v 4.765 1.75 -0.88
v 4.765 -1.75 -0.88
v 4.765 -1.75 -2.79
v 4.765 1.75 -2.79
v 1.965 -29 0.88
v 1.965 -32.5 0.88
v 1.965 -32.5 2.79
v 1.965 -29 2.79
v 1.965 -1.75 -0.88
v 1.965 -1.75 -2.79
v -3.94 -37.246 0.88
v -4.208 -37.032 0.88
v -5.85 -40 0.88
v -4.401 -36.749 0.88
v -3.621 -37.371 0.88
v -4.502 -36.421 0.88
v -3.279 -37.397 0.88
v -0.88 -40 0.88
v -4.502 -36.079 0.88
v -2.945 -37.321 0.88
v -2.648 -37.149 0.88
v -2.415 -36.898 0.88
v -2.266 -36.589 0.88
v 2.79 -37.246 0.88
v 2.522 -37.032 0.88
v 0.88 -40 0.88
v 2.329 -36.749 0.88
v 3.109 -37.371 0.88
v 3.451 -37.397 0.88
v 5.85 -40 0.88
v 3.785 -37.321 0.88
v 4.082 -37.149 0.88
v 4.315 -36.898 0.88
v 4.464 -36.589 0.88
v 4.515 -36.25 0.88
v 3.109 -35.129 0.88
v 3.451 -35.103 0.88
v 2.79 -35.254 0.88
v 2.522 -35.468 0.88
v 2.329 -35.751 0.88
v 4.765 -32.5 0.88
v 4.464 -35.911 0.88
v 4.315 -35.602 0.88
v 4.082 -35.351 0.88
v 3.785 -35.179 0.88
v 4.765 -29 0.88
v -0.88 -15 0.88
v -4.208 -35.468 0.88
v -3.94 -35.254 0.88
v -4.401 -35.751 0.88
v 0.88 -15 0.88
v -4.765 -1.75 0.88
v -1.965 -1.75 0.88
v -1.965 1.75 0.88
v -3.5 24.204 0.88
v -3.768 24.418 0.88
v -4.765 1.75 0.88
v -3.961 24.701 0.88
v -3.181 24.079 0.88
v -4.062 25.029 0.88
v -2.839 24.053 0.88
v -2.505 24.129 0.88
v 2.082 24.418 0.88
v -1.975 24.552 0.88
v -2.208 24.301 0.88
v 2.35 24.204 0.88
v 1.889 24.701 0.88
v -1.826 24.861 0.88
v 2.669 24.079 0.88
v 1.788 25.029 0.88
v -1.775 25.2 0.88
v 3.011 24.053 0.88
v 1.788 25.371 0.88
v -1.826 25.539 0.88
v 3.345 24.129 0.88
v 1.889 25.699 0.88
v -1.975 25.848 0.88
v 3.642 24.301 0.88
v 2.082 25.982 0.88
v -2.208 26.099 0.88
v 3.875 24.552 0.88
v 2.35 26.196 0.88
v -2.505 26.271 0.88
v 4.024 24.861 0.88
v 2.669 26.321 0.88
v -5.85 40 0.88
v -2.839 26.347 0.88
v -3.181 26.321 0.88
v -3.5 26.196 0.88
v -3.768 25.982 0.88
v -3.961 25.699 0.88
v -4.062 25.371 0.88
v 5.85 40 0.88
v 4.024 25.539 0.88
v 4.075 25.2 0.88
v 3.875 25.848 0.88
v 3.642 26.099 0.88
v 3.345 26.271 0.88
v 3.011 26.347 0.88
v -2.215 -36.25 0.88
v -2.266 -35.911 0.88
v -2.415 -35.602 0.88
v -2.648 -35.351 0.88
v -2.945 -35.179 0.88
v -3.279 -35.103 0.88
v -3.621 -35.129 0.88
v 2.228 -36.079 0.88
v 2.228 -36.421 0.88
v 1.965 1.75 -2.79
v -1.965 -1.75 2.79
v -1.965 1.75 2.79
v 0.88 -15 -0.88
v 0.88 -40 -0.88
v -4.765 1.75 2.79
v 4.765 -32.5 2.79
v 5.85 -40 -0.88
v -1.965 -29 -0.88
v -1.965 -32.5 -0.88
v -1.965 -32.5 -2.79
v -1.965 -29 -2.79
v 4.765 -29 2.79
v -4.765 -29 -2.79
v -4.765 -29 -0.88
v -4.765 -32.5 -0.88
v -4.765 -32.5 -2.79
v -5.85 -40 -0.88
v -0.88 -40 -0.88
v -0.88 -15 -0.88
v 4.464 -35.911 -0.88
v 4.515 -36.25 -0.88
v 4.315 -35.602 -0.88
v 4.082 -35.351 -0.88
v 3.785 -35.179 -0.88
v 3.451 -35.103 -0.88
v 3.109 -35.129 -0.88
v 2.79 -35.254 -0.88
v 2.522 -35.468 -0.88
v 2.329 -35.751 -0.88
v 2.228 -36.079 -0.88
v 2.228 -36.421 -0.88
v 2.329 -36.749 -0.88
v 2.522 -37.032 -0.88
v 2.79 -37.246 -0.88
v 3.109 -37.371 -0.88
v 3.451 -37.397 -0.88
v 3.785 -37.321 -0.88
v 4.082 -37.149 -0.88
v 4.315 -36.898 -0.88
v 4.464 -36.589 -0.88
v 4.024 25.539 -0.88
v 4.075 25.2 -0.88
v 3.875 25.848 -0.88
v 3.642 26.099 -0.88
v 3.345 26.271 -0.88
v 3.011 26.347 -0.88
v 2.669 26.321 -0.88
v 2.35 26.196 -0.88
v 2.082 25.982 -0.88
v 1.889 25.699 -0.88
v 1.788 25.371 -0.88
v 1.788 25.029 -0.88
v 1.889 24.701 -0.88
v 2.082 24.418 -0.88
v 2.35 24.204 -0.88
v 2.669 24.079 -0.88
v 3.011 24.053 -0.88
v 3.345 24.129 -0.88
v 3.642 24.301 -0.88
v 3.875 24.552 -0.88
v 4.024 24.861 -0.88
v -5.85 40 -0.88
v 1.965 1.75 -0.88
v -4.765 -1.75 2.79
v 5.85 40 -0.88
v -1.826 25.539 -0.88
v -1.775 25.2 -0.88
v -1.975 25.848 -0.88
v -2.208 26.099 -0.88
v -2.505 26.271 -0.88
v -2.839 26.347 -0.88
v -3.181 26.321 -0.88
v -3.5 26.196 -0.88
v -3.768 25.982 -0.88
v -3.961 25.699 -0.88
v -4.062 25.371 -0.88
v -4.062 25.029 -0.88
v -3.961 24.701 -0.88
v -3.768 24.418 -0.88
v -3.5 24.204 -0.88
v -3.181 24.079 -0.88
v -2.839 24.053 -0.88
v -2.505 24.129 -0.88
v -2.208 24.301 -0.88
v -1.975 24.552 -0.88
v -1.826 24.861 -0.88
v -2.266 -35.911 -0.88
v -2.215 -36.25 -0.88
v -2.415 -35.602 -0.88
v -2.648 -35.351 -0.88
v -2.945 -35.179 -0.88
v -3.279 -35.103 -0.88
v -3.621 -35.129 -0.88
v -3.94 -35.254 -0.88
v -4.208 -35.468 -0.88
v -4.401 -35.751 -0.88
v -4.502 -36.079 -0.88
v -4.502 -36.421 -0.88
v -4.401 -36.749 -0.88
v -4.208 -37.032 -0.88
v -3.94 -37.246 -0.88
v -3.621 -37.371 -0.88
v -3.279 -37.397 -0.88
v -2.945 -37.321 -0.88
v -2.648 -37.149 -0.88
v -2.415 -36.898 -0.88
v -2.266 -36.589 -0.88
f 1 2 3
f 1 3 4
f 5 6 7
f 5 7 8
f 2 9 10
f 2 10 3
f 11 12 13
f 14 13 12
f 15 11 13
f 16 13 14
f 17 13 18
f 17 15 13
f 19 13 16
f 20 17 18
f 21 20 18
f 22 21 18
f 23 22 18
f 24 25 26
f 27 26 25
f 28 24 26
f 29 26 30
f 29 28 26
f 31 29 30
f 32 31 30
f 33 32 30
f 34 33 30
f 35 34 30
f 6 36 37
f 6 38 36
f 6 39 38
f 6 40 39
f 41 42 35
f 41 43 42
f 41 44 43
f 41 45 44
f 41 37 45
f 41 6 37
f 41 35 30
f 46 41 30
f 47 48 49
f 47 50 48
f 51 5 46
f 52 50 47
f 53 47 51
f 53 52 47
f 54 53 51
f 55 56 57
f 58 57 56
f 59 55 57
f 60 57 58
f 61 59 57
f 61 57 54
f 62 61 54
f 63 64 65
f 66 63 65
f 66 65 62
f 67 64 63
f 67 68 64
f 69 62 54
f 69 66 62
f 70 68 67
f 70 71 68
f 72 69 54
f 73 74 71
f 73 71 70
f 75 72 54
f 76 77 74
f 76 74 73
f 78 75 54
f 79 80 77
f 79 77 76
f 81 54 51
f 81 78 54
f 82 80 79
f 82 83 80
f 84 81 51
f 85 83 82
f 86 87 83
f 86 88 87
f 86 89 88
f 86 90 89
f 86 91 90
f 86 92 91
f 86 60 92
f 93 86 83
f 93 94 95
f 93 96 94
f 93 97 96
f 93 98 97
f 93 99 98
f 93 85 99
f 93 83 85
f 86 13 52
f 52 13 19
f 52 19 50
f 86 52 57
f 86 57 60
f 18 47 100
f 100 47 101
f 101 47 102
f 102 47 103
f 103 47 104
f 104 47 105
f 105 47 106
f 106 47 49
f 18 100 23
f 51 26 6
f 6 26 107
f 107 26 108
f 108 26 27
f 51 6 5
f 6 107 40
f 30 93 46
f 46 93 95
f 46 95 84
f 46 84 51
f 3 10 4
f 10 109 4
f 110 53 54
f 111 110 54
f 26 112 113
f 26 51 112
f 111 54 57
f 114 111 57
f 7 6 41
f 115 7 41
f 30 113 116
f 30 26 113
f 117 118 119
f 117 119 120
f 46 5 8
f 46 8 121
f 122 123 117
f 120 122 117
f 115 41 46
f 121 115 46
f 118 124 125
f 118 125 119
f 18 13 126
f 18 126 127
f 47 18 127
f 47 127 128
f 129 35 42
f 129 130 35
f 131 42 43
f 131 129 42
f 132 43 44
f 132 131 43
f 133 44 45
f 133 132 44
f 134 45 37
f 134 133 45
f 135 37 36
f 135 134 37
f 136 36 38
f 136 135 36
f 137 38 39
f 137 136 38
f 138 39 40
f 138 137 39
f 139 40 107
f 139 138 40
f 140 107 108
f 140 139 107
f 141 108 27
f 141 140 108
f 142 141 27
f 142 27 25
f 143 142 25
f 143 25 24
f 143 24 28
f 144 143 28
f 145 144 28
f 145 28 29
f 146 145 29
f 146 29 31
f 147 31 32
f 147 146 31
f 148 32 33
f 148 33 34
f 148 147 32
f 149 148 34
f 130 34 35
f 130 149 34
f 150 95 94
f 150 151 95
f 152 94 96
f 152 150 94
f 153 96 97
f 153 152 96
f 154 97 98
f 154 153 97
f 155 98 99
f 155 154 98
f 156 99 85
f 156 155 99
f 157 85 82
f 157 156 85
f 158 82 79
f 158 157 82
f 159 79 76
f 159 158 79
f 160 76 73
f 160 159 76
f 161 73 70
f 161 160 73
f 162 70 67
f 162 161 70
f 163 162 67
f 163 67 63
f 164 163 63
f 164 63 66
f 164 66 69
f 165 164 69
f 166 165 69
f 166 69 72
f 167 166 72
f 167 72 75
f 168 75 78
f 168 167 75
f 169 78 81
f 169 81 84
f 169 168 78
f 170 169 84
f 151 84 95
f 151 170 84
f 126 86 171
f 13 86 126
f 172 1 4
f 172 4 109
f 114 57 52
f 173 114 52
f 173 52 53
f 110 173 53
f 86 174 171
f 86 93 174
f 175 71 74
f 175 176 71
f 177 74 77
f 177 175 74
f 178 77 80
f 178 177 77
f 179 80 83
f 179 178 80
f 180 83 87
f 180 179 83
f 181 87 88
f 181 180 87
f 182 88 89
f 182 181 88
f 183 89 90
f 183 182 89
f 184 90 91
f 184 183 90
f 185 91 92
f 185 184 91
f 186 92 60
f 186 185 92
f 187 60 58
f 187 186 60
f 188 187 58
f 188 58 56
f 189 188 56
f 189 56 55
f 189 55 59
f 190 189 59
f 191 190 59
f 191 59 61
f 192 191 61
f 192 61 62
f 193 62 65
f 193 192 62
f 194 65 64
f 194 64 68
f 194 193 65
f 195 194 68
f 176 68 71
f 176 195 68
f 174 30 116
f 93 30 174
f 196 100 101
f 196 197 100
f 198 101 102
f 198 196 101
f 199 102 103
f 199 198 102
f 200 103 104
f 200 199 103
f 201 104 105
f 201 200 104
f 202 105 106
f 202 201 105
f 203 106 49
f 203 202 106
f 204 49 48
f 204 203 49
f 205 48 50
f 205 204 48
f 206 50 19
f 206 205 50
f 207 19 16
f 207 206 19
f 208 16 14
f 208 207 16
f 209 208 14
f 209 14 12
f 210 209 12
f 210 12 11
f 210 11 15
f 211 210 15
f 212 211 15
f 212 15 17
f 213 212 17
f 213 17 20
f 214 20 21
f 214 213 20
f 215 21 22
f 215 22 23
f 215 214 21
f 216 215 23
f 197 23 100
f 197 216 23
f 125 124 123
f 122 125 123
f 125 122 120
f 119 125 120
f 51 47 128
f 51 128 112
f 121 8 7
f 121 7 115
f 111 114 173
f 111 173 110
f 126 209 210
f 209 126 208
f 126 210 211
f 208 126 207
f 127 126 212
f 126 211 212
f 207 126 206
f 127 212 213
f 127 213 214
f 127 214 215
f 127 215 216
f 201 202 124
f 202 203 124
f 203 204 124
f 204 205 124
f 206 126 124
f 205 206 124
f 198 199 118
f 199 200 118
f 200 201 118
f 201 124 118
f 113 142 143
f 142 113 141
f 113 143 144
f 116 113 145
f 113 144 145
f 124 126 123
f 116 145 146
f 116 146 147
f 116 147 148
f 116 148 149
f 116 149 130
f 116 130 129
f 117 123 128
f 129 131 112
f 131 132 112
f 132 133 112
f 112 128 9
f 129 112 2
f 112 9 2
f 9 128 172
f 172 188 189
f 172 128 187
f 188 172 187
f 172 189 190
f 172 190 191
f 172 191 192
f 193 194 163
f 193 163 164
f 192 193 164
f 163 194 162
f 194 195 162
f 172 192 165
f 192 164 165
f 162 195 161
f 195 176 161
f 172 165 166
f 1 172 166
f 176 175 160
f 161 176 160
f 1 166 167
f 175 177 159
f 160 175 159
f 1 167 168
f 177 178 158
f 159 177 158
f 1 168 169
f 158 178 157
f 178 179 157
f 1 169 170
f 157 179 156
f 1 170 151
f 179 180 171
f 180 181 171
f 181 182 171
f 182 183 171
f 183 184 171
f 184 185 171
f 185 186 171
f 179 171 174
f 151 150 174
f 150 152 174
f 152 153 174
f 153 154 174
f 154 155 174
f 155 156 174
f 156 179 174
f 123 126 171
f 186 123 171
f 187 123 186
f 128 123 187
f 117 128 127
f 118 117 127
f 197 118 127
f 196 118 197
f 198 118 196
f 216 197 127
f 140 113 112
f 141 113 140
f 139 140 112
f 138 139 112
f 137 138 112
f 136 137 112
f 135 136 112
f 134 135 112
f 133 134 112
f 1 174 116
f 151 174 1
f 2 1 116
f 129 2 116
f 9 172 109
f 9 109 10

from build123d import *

# Parameters (mm, degrees)
F0_R      = 1.15
F1_DEPTH  = 0.88
F2_DEPTH  = 0.88
F3_W      = 2.8
F3_H      = 3.5
F4_DEPTH  = 2.79
F5_W      = 2.8
F5_H      = 3.5
F6_DEPTH  = 2.79
F8_DEPTH  = 2.79
F10_DEPTH = 2.79


with BuildPart() as f1:
    # F0 (on Top) → F1 (new body)
    with BuildSketch(Plane.XY):
        Polygon((5.85, 40), (-5.85, 40), (-5.85, 0), (-5.85, -40), (-0.88, -40), (-0.88, -15), (0.88, -15), (0.88, -40), (5.85, -40), (5.85, 0), align=None)
        with Locations((-3.365, -36.25)):
            Circle(F0_R, mode=Mode.SUBTRACT)
        with Locations((3.365, -36.25)):
            Circle(F0_R, mode=Mode.SUBTRACT)
        with Locations((-2.925, 25.2)):
            Circle(F0_R, mode=Mode.SUBTRACT)
        with Locations((2.925, 25.2)):
            Circle(F0_R, mode=Mode.SUBTRACT)
    extrude(amount=F1_DEPTH)

    # F0 (on Top) → F2 (join)
    with BuildSketch(Plane.XY):
        Polygon((5.85, 40), (-5.85, 40), (-5.85, 0), (-5.85, -40), (-0.88, -40), (-0.88, -15), (0.88, -15), (0.88, -40), (5.85, -40), (5.85, 0), align=None)
        with Locations((-3.365, -36.25)):
            Circle(F0_R, mode=Mode.SUBTRACT)
        with Locations((3.365, -36.25)):
            Circle(F0_R, mode=Mode.SUBTRACT)
        with Locations((-2.925, 25.2)):
            Circle(F0_R, mode=Mode.SUBTRACT)
        with Locations((2.925, 25.2)):
            Circle(F0_R, mode=Mode.SUBTRACT)
    extrude(amount=-F2_DEPTH)

    # F3 (on Top) → F4 (join)
    with BuildSketch(Plane.XY):
        with Locations((3.365, -30.75)):
            Rectangle(F3_W, F3_H)
    extrude(amount=F4_DEPTH)

    # F5 (on Top) → F6 (join)
    with BuildSketch(Plane.XY):
        with Locations((-3.365, -30.75)):
            Rectangle(F5_W, F5_H)
    extrude(amount=-F6_DEPTH)

    # F7 (on Top) → F8 (join)
    with BuildSketch(Plane.XY):
        Polygon((-1.965, -1.75), (-1.965, 0), (-1.965, 1.75), (-4.765, 1.75), (-4.765, 0), (-4.765, -1.75), align=None)
    extrude(amount=F8_DEPTH)

    # F9 (on Top) → F10 (join)
    with BuildSketch(Plane.XY):
        Polygon((1.965, -1.75), (4.765, -1.75), (4.765, 0), (4.765, 1.75), (1.965, 1.75), (1.965, 0), align=None)
    extrude(amount=-F10_DEPTH)


solid = f1.part
